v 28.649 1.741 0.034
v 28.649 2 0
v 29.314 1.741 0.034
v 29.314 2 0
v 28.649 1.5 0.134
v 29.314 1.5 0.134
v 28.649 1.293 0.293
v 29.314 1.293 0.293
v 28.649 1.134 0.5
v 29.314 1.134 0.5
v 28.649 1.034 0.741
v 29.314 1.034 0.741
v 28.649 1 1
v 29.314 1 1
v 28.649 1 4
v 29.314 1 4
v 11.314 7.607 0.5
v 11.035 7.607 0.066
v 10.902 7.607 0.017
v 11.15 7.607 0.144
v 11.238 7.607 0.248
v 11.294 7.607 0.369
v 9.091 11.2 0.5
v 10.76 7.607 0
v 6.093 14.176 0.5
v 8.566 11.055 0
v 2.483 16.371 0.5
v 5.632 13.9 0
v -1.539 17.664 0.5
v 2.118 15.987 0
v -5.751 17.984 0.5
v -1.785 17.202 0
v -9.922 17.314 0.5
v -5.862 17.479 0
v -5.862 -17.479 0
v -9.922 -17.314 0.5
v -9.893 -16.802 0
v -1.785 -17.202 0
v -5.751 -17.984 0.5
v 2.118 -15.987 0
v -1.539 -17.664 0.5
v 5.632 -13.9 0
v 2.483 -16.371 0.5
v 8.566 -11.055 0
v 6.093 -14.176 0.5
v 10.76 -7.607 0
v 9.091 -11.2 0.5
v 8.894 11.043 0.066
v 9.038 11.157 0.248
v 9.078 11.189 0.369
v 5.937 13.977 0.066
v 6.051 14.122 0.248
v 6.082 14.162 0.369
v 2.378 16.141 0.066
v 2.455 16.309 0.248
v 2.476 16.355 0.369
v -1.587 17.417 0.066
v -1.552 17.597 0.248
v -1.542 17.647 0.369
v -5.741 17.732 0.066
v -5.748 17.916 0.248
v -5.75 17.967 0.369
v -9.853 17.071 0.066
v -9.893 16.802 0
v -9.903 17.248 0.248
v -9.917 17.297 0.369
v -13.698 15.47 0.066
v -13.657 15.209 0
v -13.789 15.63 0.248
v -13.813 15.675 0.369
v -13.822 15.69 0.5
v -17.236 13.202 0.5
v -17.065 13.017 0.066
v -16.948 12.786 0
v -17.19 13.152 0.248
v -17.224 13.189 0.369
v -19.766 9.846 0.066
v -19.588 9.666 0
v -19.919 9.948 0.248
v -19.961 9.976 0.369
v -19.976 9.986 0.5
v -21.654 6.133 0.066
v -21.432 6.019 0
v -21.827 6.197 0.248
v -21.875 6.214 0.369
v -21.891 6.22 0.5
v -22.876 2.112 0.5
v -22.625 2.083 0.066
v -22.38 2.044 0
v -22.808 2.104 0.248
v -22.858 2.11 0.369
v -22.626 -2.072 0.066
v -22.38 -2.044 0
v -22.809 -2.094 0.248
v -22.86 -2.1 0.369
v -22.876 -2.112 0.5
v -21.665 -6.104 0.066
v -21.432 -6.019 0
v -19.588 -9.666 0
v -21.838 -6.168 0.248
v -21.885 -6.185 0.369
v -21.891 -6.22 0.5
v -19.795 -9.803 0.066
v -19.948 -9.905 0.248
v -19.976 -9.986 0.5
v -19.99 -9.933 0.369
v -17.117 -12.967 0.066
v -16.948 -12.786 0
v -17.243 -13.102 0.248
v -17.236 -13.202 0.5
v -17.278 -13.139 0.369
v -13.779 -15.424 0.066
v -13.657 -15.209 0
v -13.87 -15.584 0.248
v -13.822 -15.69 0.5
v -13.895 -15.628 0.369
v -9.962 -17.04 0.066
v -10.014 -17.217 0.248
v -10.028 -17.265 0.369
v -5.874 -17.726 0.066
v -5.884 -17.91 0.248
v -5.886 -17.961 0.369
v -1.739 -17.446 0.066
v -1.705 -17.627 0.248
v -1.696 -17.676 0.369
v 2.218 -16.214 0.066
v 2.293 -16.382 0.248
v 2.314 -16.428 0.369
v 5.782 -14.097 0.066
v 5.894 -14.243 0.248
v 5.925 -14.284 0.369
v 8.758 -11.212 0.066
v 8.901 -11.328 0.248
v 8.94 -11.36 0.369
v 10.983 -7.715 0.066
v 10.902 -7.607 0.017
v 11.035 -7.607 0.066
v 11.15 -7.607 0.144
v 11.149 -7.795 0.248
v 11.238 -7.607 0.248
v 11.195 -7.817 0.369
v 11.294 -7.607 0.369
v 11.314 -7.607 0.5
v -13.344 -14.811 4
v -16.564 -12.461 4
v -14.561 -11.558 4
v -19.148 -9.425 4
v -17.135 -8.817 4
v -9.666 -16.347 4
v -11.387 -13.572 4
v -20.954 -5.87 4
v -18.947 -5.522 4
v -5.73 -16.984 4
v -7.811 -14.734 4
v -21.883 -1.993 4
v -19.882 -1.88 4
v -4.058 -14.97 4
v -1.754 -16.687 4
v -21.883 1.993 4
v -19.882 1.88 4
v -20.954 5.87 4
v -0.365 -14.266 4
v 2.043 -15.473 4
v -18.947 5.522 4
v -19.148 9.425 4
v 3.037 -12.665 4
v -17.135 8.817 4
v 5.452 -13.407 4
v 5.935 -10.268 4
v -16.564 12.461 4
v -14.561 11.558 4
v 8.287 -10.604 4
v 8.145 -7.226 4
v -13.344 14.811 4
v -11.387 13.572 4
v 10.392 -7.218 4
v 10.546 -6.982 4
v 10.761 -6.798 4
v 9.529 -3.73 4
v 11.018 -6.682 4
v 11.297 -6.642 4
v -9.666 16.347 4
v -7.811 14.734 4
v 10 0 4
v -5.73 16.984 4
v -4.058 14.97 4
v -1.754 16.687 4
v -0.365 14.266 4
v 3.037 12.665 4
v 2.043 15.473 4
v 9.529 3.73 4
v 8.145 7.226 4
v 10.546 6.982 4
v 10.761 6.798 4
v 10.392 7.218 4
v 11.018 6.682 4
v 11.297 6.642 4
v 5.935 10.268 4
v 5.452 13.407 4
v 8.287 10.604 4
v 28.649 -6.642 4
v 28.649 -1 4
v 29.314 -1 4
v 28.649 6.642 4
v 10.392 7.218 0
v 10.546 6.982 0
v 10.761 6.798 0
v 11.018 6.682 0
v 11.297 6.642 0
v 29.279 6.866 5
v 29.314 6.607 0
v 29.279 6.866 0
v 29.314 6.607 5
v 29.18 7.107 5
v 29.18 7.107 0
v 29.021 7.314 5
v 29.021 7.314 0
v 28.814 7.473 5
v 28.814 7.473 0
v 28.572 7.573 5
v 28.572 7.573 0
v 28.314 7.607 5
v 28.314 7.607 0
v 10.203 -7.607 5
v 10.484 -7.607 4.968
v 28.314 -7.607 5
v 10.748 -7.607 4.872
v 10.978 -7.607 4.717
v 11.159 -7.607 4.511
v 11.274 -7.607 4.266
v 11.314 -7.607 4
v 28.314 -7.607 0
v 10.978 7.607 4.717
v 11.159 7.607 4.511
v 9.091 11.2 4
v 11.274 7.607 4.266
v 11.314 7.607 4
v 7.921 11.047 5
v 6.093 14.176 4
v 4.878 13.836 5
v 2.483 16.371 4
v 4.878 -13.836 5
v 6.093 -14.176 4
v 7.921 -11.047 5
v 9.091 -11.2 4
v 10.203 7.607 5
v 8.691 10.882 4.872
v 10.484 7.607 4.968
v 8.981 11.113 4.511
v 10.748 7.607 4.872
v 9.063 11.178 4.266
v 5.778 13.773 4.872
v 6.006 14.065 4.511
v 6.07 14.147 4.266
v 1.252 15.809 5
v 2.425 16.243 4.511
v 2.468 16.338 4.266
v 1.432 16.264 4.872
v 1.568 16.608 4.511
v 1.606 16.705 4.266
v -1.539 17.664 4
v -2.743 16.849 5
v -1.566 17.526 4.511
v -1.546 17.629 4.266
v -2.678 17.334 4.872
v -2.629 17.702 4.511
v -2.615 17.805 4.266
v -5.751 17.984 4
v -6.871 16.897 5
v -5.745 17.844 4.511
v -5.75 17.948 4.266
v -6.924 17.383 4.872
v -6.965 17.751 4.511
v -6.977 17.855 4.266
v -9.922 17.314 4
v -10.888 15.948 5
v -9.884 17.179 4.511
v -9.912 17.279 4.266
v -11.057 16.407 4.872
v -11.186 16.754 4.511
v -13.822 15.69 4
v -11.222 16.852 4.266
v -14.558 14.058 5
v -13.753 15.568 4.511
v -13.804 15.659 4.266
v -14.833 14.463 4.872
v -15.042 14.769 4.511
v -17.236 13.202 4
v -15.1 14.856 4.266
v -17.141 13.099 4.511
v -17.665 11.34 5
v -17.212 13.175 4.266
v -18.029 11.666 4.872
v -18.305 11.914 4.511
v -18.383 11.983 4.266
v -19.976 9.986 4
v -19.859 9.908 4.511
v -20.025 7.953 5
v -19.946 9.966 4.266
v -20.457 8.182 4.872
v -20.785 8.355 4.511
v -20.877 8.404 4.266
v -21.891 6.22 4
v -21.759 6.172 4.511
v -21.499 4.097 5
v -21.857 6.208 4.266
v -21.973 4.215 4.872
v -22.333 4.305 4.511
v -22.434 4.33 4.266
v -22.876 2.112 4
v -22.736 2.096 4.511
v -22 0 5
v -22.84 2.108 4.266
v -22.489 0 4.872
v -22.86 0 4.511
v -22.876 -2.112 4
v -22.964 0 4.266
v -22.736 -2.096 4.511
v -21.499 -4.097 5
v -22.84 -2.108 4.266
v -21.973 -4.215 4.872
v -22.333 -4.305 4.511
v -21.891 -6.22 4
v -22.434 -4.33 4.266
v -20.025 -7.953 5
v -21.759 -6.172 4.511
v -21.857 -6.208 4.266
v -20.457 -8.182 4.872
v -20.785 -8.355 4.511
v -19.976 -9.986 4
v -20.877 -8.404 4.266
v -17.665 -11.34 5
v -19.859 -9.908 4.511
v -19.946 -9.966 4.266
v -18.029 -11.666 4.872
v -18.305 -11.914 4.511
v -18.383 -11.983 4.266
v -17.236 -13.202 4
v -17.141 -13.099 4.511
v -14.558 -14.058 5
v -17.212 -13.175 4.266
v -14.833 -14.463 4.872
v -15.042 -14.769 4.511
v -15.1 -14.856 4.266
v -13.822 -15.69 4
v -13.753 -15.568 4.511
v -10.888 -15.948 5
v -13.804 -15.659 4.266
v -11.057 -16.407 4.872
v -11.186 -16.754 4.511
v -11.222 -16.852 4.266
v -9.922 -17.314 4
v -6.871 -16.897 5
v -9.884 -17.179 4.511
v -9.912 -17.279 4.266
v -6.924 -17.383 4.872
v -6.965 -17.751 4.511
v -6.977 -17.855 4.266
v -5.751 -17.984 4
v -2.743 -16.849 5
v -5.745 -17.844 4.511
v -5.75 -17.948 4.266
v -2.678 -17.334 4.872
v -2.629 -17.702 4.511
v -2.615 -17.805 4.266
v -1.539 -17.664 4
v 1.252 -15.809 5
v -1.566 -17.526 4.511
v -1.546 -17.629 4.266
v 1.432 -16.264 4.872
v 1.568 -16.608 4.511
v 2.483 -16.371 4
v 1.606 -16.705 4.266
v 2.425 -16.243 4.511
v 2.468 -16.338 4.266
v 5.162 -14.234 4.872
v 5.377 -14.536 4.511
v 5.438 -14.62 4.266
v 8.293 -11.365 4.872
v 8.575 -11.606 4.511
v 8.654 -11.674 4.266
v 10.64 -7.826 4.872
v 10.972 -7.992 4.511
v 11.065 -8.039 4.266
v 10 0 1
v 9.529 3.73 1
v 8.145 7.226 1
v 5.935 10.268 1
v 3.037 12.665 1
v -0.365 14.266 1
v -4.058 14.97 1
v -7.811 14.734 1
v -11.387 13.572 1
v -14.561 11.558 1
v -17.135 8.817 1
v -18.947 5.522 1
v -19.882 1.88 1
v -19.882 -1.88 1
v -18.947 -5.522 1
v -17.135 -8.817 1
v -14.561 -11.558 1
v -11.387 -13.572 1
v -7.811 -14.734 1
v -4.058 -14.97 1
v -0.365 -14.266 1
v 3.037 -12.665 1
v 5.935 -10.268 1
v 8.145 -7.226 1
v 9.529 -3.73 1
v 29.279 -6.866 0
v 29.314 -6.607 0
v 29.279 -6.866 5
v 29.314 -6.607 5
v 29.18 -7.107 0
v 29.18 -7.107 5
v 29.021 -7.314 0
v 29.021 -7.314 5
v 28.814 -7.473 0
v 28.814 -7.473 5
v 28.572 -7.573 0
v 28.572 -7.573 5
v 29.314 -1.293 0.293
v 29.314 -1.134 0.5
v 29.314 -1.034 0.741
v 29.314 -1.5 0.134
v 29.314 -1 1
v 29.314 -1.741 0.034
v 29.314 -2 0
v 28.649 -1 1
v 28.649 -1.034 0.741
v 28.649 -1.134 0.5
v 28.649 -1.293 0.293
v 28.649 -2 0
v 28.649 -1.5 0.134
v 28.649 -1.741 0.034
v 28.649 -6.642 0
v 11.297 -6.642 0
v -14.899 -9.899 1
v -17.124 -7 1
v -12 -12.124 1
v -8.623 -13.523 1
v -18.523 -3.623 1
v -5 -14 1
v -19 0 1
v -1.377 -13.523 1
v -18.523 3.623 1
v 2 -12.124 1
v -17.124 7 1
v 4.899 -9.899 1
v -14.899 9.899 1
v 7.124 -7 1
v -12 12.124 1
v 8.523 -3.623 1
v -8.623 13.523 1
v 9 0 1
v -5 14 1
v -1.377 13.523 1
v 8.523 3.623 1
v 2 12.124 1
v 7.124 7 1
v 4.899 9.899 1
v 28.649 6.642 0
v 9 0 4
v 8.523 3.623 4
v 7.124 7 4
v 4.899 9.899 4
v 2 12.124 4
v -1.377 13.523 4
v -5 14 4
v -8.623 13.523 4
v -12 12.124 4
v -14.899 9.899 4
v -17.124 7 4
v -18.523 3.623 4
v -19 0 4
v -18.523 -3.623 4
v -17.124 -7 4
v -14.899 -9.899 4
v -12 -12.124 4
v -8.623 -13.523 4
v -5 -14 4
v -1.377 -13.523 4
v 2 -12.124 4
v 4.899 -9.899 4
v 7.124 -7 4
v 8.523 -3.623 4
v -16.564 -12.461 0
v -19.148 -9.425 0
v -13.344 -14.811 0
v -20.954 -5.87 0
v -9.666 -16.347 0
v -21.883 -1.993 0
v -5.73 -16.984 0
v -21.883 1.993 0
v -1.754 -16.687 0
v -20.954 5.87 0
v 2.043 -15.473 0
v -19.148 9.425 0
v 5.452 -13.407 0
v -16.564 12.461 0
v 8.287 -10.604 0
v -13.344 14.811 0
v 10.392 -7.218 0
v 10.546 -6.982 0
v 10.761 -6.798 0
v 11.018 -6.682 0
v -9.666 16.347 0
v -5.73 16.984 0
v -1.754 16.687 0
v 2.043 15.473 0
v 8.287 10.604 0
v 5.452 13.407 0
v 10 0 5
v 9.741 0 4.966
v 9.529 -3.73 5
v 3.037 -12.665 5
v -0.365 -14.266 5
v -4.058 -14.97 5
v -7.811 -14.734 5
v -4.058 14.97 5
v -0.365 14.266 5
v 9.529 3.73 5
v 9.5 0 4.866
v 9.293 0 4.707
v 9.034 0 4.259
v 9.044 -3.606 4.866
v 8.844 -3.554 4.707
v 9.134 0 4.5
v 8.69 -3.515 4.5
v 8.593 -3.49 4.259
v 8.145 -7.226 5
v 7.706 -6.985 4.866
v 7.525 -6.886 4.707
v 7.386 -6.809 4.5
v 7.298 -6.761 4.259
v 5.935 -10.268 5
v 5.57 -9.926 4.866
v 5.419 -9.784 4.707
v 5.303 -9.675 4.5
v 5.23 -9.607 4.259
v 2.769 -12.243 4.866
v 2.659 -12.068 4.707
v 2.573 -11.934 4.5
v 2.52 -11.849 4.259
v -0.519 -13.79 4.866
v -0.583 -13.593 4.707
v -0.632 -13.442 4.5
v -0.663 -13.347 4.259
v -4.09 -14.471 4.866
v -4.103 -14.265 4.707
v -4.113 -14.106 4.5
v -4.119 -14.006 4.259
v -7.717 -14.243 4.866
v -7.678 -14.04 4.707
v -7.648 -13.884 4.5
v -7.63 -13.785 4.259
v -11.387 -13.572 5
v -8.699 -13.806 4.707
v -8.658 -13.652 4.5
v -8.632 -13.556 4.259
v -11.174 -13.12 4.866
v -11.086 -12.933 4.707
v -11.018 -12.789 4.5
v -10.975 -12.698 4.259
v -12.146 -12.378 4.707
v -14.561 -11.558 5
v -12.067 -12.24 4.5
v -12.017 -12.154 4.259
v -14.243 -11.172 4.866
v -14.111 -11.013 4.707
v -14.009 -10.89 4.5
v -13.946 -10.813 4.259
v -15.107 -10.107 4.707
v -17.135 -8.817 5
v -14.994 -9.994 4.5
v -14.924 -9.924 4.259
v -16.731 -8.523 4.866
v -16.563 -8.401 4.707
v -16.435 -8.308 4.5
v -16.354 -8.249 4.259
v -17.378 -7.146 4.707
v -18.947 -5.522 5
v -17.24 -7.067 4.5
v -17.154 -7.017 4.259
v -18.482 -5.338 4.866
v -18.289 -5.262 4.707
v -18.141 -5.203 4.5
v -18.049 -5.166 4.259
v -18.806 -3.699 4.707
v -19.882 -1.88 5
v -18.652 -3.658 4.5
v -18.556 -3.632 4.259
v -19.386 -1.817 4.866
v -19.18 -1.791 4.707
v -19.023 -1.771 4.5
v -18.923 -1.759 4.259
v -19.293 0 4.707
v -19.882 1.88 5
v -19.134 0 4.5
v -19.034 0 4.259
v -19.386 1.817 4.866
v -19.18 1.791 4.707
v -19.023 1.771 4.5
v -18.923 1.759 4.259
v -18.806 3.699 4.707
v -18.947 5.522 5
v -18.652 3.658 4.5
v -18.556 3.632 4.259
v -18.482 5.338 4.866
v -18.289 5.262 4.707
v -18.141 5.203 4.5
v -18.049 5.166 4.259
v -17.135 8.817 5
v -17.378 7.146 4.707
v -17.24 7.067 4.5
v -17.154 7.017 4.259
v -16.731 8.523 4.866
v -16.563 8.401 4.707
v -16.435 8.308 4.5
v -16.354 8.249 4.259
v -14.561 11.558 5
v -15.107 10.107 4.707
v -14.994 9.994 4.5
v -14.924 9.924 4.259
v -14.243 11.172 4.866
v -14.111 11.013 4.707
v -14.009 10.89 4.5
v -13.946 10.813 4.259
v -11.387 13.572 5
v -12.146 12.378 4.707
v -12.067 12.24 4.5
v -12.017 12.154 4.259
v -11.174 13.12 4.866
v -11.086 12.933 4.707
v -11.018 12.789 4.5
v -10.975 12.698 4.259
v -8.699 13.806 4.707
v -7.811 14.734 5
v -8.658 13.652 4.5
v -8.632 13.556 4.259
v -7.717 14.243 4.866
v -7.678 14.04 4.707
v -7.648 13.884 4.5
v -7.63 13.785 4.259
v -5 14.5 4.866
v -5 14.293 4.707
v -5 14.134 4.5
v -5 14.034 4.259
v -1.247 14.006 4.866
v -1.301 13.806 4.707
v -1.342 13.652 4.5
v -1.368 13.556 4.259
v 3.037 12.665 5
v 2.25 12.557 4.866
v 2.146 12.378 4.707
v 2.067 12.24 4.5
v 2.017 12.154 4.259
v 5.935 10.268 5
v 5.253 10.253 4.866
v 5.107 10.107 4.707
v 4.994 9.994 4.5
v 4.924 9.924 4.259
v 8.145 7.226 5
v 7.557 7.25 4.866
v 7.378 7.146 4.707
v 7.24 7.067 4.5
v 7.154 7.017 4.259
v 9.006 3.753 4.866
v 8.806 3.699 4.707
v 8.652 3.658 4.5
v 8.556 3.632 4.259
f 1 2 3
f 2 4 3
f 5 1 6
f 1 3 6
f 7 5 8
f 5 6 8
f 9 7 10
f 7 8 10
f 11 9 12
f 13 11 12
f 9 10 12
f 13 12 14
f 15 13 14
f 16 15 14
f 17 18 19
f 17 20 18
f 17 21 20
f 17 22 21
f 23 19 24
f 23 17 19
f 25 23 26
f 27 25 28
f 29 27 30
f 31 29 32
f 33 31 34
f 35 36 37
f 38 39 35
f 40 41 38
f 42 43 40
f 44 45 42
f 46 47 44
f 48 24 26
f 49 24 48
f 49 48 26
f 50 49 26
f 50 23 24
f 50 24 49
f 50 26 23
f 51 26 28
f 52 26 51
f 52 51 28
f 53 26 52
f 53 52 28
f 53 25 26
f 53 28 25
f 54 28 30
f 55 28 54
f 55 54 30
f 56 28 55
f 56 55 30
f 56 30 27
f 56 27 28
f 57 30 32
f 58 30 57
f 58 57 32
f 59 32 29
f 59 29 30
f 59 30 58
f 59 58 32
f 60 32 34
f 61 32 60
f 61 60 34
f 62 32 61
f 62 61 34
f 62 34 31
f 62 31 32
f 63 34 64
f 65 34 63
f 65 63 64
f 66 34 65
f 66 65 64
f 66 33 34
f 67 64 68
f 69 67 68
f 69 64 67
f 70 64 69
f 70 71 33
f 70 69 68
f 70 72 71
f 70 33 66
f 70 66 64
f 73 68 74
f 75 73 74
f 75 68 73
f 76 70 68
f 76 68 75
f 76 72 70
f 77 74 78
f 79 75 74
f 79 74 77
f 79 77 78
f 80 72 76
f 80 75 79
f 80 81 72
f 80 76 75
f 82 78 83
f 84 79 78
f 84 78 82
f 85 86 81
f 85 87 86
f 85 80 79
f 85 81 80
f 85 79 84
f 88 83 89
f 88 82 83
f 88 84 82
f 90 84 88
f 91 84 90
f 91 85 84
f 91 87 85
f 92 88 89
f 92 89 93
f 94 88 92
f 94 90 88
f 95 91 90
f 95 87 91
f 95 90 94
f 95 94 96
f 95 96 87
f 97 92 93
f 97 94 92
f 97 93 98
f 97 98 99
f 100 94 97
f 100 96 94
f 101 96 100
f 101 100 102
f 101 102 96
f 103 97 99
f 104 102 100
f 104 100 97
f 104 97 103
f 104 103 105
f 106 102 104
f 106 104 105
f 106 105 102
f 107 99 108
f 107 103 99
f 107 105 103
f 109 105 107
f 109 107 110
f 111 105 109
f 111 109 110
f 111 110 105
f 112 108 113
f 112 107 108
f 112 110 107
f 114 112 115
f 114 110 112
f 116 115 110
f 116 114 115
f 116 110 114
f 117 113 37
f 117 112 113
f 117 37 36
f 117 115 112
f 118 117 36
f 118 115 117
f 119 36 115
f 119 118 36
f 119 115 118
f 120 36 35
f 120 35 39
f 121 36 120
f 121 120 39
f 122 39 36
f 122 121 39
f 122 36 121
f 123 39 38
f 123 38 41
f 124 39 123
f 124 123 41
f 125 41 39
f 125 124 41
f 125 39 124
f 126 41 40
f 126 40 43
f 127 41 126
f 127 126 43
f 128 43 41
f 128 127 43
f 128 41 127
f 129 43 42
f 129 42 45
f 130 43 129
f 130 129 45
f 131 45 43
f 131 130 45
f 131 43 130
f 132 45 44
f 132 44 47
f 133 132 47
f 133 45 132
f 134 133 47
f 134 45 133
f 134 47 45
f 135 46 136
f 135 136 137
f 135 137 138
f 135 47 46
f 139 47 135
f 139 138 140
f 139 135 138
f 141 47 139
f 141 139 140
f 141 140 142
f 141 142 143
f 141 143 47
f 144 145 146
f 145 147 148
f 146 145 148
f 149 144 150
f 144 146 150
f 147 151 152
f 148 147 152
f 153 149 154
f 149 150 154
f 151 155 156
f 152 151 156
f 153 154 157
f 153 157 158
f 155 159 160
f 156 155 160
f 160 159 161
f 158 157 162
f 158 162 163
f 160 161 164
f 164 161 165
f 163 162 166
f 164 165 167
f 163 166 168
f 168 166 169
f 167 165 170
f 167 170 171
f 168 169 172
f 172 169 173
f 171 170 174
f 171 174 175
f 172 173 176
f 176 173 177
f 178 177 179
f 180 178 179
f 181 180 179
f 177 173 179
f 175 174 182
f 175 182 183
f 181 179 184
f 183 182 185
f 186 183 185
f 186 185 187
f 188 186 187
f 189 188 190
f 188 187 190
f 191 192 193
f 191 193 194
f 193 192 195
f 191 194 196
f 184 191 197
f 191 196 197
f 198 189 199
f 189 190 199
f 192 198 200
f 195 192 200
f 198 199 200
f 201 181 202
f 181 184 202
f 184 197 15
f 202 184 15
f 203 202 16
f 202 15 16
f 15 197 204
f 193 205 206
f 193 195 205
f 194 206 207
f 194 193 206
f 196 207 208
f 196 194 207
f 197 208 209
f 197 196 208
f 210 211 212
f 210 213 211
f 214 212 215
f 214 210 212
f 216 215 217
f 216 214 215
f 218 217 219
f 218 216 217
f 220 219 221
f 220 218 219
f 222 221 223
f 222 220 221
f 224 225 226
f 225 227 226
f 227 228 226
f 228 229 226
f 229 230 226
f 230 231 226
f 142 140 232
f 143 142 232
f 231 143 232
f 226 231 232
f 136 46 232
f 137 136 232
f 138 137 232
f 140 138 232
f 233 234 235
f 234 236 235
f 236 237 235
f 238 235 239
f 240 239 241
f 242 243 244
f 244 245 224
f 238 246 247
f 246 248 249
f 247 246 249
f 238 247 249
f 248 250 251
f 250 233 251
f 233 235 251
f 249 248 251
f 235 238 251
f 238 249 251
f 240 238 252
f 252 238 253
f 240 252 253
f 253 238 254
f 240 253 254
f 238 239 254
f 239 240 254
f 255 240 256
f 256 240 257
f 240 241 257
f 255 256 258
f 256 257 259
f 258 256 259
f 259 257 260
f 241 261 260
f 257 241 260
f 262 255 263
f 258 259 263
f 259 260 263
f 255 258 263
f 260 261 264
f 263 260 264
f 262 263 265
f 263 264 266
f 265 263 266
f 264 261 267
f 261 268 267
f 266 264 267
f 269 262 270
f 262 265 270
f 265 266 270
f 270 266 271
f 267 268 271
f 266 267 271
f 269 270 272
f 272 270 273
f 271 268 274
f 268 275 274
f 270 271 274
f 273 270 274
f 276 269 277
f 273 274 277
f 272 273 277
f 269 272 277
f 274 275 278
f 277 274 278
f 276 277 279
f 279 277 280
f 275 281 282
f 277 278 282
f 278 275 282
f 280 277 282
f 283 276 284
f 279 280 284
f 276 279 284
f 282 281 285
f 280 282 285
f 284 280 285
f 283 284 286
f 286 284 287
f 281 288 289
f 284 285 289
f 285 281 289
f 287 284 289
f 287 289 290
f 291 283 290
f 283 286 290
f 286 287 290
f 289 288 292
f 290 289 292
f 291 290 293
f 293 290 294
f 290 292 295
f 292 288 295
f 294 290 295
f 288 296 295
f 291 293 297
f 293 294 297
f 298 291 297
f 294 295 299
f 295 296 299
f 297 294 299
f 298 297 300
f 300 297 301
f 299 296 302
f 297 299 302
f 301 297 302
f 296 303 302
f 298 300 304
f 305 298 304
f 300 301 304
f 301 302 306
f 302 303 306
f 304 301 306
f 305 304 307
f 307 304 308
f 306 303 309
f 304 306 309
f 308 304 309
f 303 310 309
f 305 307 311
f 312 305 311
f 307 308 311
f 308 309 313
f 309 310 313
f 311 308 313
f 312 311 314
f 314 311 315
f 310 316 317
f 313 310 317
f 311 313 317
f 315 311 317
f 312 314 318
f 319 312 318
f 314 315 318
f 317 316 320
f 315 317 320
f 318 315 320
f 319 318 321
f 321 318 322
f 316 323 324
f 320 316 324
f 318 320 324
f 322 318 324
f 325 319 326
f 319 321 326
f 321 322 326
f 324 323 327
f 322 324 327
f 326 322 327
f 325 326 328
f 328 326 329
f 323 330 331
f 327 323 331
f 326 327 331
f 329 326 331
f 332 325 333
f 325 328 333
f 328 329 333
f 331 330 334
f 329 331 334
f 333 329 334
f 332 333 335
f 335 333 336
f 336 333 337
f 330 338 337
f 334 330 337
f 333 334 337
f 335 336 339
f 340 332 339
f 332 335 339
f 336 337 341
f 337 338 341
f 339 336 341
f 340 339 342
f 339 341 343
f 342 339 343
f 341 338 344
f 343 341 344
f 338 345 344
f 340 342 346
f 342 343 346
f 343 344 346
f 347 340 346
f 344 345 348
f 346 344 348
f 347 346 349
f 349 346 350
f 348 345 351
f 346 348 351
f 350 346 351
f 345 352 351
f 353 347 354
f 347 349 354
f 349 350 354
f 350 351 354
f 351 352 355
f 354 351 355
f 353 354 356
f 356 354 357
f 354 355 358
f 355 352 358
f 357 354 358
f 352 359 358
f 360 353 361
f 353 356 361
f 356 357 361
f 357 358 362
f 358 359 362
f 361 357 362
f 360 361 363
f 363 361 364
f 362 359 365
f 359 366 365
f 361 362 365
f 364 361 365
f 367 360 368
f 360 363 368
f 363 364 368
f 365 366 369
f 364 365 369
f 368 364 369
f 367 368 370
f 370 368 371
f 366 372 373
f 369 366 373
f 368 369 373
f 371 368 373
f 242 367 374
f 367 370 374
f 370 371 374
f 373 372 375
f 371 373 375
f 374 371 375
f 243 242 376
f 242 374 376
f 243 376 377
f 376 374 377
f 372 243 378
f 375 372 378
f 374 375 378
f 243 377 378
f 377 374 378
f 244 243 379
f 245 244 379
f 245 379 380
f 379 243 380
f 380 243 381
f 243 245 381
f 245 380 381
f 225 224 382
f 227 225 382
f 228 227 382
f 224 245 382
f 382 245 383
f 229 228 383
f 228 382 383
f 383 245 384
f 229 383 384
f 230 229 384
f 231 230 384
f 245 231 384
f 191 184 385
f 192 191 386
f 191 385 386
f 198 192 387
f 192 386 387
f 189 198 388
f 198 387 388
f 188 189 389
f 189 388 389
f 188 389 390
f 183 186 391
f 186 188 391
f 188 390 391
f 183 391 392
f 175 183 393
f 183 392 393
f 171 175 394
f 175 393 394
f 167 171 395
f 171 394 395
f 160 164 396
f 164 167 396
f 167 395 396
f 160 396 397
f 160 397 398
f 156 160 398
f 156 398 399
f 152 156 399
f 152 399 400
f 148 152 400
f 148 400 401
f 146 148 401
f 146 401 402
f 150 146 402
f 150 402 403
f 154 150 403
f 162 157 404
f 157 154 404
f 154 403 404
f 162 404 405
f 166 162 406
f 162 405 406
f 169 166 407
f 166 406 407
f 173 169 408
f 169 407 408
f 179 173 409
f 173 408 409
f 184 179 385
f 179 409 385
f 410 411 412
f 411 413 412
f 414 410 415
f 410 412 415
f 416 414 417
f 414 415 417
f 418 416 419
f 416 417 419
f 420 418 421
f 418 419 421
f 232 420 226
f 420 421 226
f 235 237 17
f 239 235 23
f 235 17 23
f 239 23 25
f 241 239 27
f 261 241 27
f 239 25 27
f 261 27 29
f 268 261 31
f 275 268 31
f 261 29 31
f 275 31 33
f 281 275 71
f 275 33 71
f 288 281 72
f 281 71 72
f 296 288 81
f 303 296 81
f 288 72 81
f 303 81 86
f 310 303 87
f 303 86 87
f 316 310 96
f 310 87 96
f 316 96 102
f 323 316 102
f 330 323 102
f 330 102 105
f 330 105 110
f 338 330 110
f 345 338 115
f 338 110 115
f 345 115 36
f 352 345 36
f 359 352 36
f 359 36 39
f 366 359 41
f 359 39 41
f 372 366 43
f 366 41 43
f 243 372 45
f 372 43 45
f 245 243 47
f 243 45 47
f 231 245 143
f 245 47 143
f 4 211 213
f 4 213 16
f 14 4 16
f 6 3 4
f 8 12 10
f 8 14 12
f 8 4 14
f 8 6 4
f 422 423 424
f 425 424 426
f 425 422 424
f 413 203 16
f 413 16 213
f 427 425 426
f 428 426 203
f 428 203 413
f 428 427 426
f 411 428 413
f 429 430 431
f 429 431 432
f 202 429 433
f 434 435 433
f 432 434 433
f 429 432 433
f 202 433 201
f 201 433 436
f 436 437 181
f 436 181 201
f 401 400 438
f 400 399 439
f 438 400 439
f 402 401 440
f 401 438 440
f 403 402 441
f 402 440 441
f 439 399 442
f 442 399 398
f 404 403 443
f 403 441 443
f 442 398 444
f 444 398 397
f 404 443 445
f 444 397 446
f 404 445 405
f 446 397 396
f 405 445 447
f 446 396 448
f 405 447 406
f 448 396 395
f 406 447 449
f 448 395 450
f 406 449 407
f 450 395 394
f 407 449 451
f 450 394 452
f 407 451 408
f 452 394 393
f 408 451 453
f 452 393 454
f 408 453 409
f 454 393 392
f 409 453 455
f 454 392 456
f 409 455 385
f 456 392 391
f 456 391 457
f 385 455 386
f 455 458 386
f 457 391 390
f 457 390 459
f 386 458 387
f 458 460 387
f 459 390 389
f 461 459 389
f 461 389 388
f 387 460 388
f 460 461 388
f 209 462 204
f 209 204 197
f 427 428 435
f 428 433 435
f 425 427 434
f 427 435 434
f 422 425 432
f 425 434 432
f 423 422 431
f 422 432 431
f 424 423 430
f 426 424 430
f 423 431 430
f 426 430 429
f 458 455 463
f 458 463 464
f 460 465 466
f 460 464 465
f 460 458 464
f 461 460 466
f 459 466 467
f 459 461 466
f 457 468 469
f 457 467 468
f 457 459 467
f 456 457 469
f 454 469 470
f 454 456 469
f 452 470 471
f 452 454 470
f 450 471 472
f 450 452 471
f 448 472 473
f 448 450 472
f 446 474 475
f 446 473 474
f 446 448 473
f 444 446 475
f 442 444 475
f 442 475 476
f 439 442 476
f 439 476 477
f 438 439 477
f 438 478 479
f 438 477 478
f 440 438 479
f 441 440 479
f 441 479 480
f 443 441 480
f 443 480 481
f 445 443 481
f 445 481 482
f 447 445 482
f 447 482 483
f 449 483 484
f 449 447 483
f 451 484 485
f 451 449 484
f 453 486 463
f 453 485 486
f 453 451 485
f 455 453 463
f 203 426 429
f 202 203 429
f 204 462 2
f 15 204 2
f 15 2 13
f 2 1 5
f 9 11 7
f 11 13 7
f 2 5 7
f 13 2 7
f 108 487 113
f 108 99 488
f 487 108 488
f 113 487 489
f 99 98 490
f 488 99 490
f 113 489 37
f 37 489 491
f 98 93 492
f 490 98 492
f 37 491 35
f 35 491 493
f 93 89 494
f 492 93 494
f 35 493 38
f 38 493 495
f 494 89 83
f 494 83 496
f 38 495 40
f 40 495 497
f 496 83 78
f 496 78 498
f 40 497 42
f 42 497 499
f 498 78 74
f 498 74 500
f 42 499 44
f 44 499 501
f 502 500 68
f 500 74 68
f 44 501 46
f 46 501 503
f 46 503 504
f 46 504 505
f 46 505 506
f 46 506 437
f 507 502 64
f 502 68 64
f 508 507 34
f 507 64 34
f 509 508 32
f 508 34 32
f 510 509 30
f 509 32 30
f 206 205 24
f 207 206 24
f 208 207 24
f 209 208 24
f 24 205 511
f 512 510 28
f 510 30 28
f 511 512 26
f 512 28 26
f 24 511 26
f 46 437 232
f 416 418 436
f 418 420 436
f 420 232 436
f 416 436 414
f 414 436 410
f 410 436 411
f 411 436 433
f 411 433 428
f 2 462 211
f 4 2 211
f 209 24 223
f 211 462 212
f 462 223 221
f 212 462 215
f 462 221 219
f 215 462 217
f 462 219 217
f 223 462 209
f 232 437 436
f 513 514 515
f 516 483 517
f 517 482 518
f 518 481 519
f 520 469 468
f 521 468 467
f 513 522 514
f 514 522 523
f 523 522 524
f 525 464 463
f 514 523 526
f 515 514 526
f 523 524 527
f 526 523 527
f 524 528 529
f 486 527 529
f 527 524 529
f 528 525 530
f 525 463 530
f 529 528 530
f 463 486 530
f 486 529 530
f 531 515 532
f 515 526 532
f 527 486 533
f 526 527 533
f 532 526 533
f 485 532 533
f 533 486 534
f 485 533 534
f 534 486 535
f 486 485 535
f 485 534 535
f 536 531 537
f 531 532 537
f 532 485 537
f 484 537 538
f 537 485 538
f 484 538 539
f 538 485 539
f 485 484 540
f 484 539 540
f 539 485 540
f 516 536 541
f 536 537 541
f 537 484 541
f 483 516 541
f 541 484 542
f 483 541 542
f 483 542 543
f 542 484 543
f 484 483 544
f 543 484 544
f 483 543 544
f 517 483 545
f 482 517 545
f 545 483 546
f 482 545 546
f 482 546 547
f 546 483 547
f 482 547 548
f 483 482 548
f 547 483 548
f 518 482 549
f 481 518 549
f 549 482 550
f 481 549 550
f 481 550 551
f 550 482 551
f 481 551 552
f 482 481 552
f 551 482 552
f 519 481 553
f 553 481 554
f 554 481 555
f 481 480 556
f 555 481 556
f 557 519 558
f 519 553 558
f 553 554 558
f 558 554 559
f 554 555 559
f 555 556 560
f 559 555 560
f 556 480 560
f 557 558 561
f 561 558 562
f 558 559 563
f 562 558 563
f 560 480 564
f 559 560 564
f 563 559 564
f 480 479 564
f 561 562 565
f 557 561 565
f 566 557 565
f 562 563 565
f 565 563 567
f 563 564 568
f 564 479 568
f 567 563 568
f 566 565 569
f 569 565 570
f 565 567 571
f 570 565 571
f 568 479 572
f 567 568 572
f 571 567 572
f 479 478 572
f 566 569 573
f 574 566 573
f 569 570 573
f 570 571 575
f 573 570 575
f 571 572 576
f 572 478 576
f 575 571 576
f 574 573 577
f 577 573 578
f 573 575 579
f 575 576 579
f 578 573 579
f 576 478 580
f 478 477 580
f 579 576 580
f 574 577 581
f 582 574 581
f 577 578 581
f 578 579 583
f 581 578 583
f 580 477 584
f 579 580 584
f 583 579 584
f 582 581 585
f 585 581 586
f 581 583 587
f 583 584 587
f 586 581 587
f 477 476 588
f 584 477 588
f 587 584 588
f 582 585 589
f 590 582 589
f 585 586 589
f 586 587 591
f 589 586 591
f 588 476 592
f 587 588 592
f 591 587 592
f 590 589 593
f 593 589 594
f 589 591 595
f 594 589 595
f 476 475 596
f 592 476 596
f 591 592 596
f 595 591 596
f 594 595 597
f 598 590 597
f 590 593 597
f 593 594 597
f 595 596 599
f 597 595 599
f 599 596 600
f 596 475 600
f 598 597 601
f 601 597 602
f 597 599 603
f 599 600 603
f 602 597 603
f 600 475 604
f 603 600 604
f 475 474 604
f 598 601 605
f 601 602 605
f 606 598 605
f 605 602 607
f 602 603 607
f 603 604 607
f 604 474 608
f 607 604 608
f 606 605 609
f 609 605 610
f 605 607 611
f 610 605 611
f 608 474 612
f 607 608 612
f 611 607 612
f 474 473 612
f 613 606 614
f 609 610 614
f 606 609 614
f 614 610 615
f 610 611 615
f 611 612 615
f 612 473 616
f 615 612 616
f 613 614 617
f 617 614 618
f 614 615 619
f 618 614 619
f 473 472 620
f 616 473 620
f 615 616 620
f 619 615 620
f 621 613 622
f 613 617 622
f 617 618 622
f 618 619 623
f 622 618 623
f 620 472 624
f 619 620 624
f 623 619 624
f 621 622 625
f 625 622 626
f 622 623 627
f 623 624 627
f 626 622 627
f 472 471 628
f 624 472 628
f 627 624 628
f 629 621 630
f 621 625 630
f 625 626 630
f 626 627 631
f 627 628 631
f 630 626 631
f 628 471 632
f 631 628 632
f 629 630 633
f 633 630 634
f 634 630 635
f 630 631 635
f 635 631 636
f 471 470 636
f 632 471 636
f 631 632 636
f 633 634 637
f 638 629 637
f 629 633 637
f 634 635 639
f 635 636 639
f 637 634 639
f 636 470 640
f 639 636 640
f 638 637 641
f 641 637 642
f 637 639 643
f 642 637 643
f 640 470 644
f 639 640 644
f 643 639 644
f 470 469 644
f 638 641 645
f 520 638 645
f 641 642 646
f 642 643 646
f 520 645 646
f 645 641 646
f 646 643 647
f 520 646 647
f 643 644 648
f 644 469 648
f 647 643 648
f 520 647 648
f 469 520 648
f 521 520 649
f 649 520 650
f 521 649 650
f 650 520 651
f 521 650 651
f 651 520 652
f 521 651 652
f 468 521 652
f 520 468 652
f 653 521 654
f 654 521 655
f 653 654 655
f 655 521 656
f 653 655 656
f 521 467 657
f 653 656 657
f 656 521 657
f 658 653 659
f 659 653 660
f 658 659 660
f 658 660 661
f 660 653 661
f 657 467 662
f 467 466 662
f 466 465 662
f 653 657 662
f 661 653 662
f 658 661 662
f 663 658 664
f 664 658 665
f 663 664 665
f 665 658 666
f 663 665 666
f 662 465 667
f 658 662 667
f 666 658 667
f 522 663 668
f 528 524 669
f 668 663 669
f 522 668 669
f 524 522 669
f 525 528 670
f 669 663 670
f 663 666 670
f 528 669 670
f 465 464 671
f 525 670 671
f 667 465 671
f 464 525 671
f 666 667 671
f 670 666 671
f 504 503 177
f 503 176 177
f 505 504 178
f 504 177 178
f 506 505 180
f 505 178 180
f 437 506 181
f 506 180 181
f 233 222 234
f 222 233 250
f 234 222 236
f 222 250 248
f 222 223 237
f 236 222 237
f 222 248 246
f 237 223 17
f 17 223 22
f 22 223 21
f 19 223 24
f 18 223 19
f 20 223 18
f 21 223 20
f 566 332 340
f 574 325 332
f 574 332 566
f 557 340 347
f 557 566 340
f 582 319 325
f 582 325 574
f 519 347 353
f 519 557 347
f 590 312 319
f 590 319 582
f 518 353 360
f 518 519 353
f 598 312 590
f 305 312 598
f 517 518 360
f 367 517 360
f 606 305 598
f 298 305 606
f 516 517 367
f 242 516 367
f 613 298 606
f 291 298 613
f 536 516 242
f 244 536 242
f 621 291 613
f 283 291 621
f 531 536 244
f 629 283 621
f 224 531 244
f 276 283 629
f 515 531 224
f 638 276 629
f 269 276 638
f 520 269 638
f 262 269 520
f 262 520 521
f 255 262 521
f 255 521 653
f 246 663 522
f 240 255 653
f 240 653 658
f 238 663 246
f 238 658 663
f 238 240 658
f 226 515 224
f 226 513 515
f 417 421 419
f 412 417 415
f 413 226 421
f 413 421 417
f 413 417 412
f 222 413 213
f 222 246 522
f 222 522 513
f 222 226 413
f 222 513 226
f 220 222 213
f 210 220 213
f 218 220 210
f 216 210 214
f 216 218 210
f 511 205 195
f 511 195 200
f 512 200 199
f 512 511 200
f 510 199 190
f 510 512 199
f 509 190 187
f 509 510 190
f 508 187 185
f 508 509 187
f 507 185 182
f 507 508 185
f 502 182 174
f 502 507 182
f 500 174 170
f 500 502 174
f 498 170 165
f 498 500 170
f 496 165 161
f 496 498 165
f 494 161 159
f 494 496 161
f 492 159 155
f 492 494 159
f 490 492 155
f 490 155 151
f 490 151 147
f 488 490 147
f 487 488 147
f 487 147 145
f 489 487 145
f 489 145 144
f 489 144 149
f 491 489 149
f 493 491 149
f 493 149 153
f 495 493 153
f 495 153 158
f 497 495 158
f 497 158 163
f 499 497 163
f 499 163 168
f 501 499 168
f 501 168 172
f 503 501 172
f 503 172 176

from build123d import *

# Parameters (mm, degrees)
PAD_DEPTH       = 5
POCKET_DEPTH    = 4
SKETCH005_R     = 15
PAD001_DEPTH    = 4
FILLET_R        = 1
FILLET001_R     = 0.5
SKETCH006_R     = 14
POCKET001_DEPTH = 5.001
FILLET002_R     = 1
FILLET003_R     = 1
FILLET004_R     = 1
FILLET005_R     = 1
FILLET006_R     = 1
FILLET007_R     = 1
FILLET008_R     = 1


with BuildPart() as part:
    # Sketch001 → Pad (new body)
    with BuildSketch(Plane.XY):
        with BuildLine():
            Line((29.31354, 7.607129), (11.31354, 7.607129))
            ThreePointArc((11.31354, 7.607129), (-23, 0), (11.31354, -7.607129))
            Line((11.31354, -7.607129), (29.31354, -7.607129))
            Line((29.31354, 7.607129), (29.31354, -7.607129))
        make_face()
    extrude(amount=PAD_DEPTH)

    # Sketch004 → Pocket (cut)
    with BuildSketch(Plane.XY):
        with BuildLine():
            Line((28.648583, 6.642429), (10.648583, 6.642429))
            ThreePointArc((10.648583, 6.642429), (-22, 0), (10.648583, -6.642429))
            Line((10.648583, -6.642429), (28.648583, -6.642429))
            Line((28.648583, -1), (28.648583, -6.642429))
            Line((32.648583, -1), (28.648583, -1))
            Line((32.648583, 1), (32.648583, -1))
            Line((28.648583, 1), (32.648583, 1))
            Line((28.648583, 6.642429), (28.648583, 1))
        make_face()
    extrude(amount=POCKET_DEPTH, mode=Mode.SUBTRACT)

    # Sketch005 → Pad001 (join)
    with BuildSketch(Plane.XY.offset(1)):
        with Locations((-5, 0)):
            Circle(SKETCH005_R)
    extrude(amount=PAD001_DEPTH)

    # Fillet
    fillet_edges = [part.edges().sort_by_distance(p)[0] for p in [
        (-23, 0, 5),
    ]]
    fillet(fillet_edges, radius=FILLET_R)

    # Fillet001
    fillet001_edges = [part.edges().sort_by_distance(p)[0] for p in [
        (-23, 0, 0),
    ]]
    fillet(fillet001_edges, radius=FILLET001_R)

    # Sketch006 → Pocket001 (cut, through all)
    with BuildSketch(Plane.XY):
        with Locations((-5, 0)):
            Circle(SKETCH006_R)
    extrude(amount=POCKET001_DEPTH, mode=Mode.SUBTRACT)

    # Fillet002
    fillet002_edges = [part.edges().sort_by_distance(p)[0] for p in [
        (-19, 0, 5),
    ]]
    fillet(fillet002_edges, radius=FILLET002_R)

    # Fillet003
    fillet003_edges = [part.edges().sort_by_distance(p)[0] for p in [
        (28.981061, 1, 0),
    ]]
    fillet(fillet003_edges, radius=FILLET003_R)

    # Fillet004
    fillet004_edges = [part.edges().sort_by_distance(p)[0] for p in [
        (28.981061, -1, 0),
    ]]
    fillet(fillet004_edges, radius=FILLET004_R)

    # Fillet005
    fillet005_edges = [part.edges().sort_by_distance(p)[0] for p in [
        (29.31354, 7.607129, 2.5),
    ]]
    fillet(fillet005_edges, radius=FILLET005_R)

    # Fillet006
    fillet006_edges = [part.edges().sort_by_distance(p)[0] for p in [
        (29.31354, -7.607129, 2.5),
    ]]
    fillet(fillet006_edges, radius=FILLET006_R)

    # Fillet007
    fillet007_edges = [part.edges().sort_by_distance(p)[0] for p in [
        (10.648583, 6.642429, 2),
    ]]
    fillet(fillet007_edges, radius=FILLET007_R)

    # Fillet008
    fillet008_edges = [part.edges().sort_by_distance(p)[0] for p in [
        (10.648583, -6.642429, 2),
    ]]
    fillet(fillet008_edges, radius=FILLET008_R)


solid = part.part
